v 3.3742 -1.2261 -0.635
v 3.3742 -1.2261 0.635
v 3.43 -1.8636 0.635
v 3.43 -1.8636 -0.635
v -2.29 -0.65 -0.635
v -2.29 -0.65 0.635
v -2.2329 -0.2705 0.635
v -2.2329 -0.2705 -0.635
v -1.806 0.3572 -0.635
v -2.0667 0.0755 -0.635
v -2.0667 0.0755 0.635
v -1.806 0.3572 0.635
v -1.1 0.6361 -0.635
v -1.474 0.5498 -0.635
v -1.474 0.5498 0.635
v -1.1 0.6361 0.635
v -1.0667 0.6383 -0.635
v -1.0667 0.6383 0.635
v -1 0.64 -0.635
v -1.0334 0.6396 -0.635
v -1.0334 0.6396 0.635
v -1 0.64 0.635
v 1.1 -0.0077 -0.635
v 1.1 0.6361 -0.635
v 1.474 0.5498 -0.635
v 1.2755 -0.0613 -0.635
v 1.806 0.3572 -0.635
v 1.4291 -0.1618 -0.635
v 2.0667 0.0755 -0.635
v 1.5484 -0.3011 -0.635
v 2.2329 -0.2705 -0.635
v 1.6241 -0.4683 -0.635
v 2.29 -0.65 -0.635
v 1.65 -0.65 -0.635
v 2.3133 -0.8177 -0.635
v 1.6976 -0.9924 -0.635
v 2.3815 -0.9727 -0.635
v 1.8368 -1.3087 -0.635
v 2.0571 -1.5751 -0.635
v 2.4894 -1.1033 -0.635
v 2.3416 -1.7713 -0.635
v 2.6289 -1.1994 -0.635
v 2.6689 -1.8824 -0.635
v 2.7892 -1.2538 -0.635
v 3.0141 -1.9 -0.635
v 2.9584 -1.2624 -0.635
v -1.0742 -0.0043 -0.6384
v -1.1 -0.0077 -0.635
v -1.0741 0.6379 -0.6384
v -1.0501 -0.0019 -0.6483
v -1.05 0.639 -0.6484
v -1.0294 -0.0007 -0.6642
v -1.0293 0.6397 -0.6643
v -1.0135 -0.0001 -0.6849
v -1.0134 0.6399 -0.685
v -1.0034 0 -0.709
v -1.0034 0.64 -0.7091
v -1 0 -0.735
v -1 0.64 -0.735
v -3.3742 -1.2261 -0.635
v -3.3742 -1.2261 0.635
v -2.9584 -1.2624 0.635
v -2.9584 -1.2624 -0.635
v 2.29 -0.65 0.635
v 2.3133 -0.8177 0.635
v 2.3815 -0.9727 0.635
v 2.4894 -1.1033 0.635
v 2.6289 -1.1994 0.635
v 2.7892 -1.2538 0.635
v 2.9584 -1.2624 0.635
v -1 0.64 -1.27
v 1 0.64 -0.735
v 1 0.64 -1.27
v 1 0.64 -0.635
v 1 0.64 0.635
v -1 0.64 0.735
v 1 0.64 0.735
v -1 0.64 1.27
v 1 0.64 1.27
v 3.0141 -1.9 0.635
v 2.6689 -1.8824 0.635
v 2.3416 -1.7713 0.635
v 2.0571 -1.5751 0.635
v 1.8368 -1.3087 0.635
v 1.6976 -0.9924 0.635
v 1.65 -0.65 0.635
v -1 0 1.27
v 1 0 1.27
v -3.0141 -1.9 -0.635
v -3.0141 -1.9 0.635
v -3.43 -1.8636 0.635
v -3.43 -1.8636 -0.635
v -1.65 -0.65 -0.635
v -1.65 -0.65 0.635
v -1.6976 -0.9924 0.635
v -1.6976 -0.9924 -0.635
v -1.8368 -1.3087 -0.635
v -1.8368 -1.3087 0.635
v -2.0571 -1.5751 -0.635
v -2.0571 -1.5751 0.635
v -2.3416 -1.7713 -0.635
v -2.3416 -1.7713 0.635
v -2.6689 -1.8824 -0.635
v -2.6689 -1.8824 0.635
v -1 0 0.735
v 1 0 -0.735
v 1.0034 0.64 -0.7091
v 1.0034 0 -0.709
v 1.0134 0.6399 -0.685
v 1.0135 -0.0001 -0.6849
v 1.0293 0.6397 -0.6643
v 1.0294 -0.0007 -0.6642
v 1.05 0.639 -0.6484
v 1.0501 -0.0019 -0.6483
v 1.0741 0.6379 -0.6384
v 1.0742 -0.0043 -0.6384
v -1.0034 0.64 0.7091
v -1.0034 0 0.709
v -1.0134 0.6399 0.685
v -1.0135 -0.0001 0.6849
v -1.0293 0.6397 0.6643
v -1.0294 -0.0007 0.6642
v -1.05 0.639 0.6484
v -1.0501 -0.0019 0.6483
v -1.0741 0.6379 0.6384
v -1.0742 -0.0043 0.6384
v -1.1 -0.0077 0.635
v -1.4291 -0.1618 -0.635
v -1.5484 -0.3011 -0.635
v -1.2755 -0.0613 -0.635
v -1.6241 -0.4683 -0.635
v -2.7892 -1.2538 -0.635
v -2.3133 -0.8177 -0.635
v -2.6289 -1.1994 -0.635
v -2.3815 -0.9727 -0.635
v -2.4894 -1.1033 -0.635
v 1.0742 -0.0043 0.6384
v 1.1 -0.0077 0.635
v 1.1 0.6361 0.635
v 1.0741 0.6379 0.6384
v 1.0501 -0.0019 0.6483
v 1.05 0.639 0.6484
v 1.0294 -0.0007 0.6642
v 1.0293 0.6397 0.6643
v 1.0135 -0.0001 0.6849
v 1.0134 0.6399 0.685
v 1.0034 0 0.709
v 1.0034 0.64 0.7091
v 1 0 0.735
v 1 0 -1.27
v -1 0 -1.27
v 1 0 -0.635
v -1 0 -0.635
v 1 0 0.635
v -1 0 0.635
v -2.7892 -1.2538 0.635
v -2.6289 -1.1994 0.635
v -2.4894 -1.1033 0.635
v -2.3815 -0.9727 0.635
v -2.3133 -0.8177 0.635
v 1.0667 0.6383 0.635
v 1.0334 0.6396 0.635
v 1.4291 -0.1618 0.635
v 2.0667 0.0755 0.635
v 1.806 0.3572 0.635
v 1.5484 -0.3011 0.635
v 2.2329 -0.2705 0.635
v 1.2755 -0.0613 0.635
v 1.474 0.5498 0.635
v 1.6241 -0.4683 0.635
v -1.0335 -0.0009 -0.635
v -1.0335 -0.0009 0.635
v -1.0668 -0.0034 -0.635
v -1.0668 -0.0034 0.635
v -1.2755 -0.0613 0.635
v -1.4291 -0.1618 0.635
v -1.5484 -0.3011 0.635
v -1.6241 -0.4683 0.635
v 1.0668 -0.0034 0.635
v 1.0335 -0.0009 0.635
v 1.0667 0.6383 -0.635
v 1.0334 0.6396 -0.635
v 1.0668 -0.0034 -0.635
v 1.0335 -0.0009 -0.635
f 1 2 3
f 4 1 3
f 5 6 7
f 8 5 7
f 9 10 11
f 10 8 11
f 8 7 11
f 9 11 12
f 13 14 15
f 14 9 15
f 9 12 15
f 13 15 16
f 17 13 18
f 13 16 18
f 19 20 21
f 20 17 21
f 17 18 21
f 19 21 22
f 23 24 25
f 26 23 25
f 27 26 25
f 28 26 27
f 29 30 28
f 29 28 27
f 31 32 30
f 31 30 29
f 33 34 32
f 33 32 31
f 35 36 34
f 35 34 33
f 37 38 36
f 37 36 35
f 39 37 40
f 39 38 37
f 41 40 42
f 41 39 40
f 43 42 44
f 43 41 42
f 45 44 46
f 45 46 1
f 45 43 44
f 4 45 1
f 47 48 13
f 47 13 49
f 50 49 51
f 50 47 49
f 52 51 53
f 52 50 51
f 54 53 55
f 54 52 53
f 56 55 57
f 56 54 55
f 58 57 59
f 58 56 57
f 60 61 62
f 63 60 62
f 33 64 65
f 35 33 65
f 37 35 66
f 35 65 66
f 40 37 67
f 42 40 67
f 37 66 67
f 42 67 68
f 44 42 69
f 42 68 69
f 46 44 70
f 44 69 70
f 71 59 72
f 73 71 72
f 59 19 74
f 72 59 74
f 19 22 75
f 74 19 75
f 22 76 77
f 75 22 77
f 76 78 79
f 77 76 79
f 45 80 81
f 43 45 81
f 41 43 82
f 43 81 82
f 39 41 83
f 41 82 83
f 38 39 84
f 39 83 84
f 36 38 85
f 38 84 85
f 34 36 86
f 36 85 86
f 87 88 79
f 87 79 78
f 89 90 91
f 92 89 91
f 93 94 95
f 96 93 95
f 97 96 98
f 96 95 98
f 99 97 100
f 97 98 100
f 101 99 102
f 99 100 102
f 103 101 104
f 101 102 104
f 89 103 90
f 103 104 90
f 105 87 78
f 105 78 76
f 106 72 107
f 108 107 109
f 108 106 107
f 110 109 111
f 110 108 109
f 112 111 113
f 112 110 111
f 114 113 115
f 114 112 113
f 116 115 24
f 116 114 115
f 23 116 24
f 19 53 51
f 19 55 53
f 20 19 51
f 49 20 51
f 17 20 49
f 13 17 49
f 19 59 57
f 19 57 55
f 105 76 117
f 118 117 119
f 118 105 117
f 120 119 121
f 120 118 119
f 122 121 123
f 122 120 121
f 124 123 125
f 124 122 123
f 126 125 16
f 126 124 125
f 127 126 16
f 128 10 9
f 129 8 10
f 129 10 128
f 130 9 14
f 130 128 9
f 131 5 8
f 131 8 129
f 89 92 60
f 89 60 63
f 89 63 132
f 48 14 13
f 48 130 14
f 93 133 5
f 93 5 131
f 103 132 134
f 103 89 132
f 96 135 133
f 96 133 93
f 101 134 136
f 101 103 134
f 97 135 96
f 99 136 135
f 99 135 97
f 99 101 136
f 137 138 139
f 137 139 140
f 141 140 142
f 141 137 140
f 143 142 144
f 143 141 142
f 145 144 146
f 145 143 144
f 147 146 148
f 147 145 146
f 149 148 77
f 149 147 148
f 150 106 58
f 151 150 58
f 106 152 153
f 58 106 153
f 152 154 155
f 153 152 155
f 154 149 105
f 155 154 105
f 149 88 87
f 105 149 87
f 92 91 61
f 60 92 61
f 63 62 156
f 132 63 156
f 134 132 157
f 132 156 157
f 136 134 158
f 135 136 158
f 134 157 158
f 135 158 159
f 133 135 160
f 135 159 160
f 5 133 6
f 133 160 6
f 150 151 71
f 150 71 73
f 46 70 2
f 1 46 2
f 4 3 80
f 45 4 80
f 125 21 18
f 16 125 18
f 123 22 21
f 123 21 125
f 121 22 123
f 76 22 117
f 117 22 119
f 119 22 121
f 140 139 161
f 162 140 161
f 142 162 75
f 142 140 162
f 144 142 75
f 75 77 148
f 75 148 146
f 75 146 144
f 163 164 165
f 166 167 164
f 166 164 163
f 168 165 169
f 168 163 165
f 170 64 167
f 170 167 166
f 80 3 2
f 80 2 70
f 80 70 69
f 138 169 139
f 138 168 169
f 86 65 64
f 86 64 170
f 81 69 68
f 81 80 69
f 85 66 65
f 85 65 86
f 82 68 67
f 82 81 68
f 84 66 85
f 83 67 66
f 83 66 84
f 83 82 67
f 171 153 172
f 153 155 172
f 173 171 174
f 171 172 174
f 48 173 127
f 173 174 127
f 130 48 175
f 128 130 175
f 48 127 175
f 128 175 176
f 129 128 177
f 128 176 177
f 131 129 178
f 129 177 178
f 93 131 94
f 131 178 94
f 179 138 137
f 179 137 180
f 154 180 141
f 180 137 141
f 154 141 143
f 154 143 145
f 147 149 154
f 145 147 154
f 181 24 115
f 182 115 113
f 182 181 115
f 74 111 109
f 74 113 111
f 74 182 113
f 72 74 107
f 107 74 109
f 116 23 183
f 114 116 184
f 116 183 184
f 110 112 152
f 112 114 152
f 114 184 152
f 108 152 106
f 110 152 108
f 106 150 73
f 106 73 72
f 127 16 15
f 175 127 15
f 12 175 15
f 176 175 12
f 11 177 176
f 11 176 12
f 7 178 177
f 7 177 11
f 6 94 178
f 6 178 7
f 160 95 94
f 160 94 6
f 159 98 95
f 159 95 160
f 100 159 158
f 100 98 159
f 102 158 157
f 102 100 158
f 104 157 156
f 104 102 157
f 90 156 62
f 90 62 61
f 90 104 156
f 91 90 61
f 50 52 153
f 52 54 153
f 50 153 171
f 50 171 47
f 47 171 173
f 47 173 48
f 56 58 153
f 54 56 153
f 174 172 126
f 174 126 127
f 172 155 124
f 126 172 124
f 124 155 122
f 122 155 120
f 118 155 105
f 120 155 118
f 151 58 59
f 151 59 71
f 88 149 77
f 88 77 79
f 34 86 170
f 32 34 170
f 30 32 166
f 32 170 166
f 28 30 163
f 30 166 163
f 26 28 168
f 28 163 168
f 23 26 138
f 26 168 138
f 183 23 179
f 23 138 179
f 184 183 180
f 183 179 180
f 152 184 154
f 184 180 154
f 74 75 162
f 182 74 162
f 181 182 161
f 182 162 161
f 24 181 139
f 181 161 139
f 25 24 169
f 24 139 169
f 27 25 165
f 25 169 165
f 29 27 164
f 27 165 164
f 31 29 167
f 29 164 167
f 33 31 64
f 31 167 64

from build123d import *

# Parameters (mm, degrees)
BOSS_EXTRUDE1_DEPTH     = 1.5
CUT_EXTRUDE1_DEPTH      = 5.200365106
CUT_EXTRUDE1_DEPTH_BACK = 5.200365106
SKETCH2_OUTSIDE_W       = 10.442
SKETCH2_OUTSIDE_H       = 6.582
FILLET1_R               = 0.1


with BuildPart() as part:
    # Sketch1 → Boss-Extrude1 (new, symmetric)
    with BuildSketch(Plane.XY):
        with BuildLine():
            Line((1, 0), (-1, 0))
            ThreePointArc((-1, 0), (-1.459619408, -0.190380592), (-1.65, -0.65))
            ThreePointArc((-1.65, -0.65), (-2.057061231, -1.575117021), (-3.014135626, -1.9))
            Line((-3.014135626, -1.9), (-3.43, -1.863616582))
            Line((-3.43, -1.863616582), (-3.374220325, -1.226051975))
            Line((-3.374220325, -1.226051975), (-2.958355951, -1.262435393))
            ThreePointArc((-2.958355951, -1.262435393), (-2.489438964, -1.103259525), (-2.29, -0.65))
            ThreePointArc((-2.29, -0.65), (-1.912167748, 0.262167748), (-1, 0.64))
            Line((-1, 0.64), (1, 0.64))
            ThreePointArc((1, 0.64), (1.912167748, 0.262167748), (2.29, -0.65))
            ThreePointArc((2.29, -0.65), (2.489438964, -1.103259525), (2.958355951, -1.262435393))
            Line((2.958355951, -1.262435393), (3.374220325, -1.226051975))
            Line((3.374220325, -1.226051975), (3.43, -1.863616582))
            Line((3.43, -1.863616582), (3.014135626, -1.9))
            ThreePointArc((3.014135626, -1.9), (2.057061231, -1.575117021), (1.65, -0.65))
            ThreePointArc((1.65, -0.65), (1.459619408, -0.190380592), (1, 0))
        make_face()
    extrude(amount=BOSS_EXTRUDE1_DEPTH, both=True)

    # Sketch2 outside → Cut-Extrude1 (cut, two sides: drawn at the far end of the back side and taken through both)
    with BuildSketch(Plane(origin=(0, 0, 0), x_dir=(1, 0, 0), z_dir=(0, 1, 0)).offset(-CUT_EXTRUDE1_DEPTH_BACK)):
        Rectangle(SKETCH2_OUTSIDE_W, SKETCH2_OUTSIDE_H)
        Polygon((-1, 1.27), (1, 1.27), (1, 0.635), (3.43, 0.635), (3.43, -0.635), (1, -0.635), (1, -1.27), (-1, -1.27), (-1, -0.635), (-3.43, -0.635), (-3.43, 0.635), (-1, 0.635), align=None, mode=Mode.SUBTRACT)
    extrude(amount=CUT_EXTRUDE1_DEPTH + CUT_EXTRUDE1_DEPTH_BACK, mode=Mode.SUBTRACT)

    # Fillet1
    # the kernel refuses this fillet: 0.1 mm, written as the material it adds along each edge
    with BuildSketch(Plane(origin=(1, -0.25, 0.635), x_dir=(1, 0, 0), z_dir=(0, 1, 0))) as fillet1_piece_1_section:
        with BuildLine():
            CenterArc((FILLET1_R, -FILLET1_R), FILLET1_R, 90, 90)
            Line((0, -FILLET1_R), (0, 0))
            Line((0, 0), (FILLET1_R, 0))
        make_face()
    fillet1_piece_1 = extrude(amount=1.14, mode=Mode.PRIVATE)
    fillet1_piece_1 = fillet1_piece_1 - Plane(origin=(1, -0.65, 0.643680782), x_dir=(1, 0, 0), z_dir=(0, 0, 1)) * Cylinder(0.65, 3, mode=Mode.PRIVATE)
    fillet1_piece_1 = fillet1_piece_1 & Plane(origin=(1, -0.65, 0.643680782), x_dir=(0, 1, 0), z_dir=(0, 0, 1)) * Cylinder(1.29, 3, mode=Mode.PRIVATE)
    add(fillet1_piece_1)
    with BuildSketch(Plane(origin=(1, -0.25, -0.635), x_dir=(1, 0, 0), z_dir=(0, 1, 0))) as fillet1_piece_2_section:
        with BuildLine():
            CenterArc((FILLET1_R, FILLET1_R), FILLET1_R, 180, 90)
            Line((0, FILLET1_R), (0, 0))
            Line((0, 0), (FILLET1_R, 0))
        make_face()
    fillet1_piece_2 = extrude(amount=1.14, mode=Mode.PRIVATE)
    fillet1_piece_2 = fillet1_piece_2 - Plane(origin=(1, -0.65, -0.643680782), x_dir=(1, 0, 0), z_dir=(0, 0, 1)) * Cylinder(0.65, 3, mode=Mode.PRIVATE)
    fillet1_piece_2 = fillet1_piece_2 & Plane(origin=(1, -0.65, -0.643680782), x_dir=(0, 1, 0), z_dir=(0, 0, 1)) * Cylinder(1.29, 3, mode=Mode.PRIVATE)
    add(fillet1_piece_2)
    with BuildSketch(Plane(origin=(-1, -0.25, 0.635), x_dir=(0, 0, 1), z_dir=(0, 1, 0))) as fillet1_piece_3_section:
        with BuildLine():
            CenterArc((FILLET1_R, -FILLET1_R), FILLET1_R, 90, 90)
            Line((0, -FILLET1_R), (0, 0))
            Line((0, 0), (FILLET1_R, 0))
        make_face()
    fillet1_piece_3 = extrude(amount=1.14, mode=Mode.PRIVATE)
    fillet1_piece_3 = fillet1_piece_3 - Plane(origin=(-1, -0.65, 0.643680782), x_dir=(0, 1, 0), z_dir=(0, 0, 1)) * Cylinder(0.65, 3, mode=Mode.PRIVATE)
    fillet1_piece_3 = fillet1_piece_3 & Plane(origin=(-1, -0.65, 0.643680782), x_dir=(-1, 0, 0), z_dir=(0, 0, 1)) * Cylinder(1.29, 3, mode=Mode.PRIVATE)
    add(fillet1_piece_3)
    with BuildSketch(Plane(origin=(-1, -0.25, -0.635), x_dir=(0, 0, -1), z_dir=(0, 1, 0))) as fillet1_piece_4_section:
        with BuildLine():
            CenterArc((FILLET1_R, FILLET1_R), FILLET1_R, 180, 90)
            Line((0, FILLET1_R), (0, 0))
            Line((0, 0), (FILLET1_R, 0))
        make_face()
    fillet1_piece_4 = extrude(amount=1.14, mode=Mode.PRIVATE)
    fillet1_piece_4 = fillet1_piece_4 - Plane(origin=(-1, -0.65, -0.643680782), x_dir=(0, 1, 0), z_dir=(0, 0, 1)) * Cylinder(0.65, 3, mode=Mode.PRIVATE)
    fillet1_piece_4 = fillet1_piece_4 & Plane(origin=(-1, -0.65, -0.643680782), x_dir=(-1, 0, 0), z_dir=(0, 0, 1)) * Cylinder(1.29, 3, mode=Mode.PRIVATE)
    add(fillet1_piece_4)


solid = part.part
